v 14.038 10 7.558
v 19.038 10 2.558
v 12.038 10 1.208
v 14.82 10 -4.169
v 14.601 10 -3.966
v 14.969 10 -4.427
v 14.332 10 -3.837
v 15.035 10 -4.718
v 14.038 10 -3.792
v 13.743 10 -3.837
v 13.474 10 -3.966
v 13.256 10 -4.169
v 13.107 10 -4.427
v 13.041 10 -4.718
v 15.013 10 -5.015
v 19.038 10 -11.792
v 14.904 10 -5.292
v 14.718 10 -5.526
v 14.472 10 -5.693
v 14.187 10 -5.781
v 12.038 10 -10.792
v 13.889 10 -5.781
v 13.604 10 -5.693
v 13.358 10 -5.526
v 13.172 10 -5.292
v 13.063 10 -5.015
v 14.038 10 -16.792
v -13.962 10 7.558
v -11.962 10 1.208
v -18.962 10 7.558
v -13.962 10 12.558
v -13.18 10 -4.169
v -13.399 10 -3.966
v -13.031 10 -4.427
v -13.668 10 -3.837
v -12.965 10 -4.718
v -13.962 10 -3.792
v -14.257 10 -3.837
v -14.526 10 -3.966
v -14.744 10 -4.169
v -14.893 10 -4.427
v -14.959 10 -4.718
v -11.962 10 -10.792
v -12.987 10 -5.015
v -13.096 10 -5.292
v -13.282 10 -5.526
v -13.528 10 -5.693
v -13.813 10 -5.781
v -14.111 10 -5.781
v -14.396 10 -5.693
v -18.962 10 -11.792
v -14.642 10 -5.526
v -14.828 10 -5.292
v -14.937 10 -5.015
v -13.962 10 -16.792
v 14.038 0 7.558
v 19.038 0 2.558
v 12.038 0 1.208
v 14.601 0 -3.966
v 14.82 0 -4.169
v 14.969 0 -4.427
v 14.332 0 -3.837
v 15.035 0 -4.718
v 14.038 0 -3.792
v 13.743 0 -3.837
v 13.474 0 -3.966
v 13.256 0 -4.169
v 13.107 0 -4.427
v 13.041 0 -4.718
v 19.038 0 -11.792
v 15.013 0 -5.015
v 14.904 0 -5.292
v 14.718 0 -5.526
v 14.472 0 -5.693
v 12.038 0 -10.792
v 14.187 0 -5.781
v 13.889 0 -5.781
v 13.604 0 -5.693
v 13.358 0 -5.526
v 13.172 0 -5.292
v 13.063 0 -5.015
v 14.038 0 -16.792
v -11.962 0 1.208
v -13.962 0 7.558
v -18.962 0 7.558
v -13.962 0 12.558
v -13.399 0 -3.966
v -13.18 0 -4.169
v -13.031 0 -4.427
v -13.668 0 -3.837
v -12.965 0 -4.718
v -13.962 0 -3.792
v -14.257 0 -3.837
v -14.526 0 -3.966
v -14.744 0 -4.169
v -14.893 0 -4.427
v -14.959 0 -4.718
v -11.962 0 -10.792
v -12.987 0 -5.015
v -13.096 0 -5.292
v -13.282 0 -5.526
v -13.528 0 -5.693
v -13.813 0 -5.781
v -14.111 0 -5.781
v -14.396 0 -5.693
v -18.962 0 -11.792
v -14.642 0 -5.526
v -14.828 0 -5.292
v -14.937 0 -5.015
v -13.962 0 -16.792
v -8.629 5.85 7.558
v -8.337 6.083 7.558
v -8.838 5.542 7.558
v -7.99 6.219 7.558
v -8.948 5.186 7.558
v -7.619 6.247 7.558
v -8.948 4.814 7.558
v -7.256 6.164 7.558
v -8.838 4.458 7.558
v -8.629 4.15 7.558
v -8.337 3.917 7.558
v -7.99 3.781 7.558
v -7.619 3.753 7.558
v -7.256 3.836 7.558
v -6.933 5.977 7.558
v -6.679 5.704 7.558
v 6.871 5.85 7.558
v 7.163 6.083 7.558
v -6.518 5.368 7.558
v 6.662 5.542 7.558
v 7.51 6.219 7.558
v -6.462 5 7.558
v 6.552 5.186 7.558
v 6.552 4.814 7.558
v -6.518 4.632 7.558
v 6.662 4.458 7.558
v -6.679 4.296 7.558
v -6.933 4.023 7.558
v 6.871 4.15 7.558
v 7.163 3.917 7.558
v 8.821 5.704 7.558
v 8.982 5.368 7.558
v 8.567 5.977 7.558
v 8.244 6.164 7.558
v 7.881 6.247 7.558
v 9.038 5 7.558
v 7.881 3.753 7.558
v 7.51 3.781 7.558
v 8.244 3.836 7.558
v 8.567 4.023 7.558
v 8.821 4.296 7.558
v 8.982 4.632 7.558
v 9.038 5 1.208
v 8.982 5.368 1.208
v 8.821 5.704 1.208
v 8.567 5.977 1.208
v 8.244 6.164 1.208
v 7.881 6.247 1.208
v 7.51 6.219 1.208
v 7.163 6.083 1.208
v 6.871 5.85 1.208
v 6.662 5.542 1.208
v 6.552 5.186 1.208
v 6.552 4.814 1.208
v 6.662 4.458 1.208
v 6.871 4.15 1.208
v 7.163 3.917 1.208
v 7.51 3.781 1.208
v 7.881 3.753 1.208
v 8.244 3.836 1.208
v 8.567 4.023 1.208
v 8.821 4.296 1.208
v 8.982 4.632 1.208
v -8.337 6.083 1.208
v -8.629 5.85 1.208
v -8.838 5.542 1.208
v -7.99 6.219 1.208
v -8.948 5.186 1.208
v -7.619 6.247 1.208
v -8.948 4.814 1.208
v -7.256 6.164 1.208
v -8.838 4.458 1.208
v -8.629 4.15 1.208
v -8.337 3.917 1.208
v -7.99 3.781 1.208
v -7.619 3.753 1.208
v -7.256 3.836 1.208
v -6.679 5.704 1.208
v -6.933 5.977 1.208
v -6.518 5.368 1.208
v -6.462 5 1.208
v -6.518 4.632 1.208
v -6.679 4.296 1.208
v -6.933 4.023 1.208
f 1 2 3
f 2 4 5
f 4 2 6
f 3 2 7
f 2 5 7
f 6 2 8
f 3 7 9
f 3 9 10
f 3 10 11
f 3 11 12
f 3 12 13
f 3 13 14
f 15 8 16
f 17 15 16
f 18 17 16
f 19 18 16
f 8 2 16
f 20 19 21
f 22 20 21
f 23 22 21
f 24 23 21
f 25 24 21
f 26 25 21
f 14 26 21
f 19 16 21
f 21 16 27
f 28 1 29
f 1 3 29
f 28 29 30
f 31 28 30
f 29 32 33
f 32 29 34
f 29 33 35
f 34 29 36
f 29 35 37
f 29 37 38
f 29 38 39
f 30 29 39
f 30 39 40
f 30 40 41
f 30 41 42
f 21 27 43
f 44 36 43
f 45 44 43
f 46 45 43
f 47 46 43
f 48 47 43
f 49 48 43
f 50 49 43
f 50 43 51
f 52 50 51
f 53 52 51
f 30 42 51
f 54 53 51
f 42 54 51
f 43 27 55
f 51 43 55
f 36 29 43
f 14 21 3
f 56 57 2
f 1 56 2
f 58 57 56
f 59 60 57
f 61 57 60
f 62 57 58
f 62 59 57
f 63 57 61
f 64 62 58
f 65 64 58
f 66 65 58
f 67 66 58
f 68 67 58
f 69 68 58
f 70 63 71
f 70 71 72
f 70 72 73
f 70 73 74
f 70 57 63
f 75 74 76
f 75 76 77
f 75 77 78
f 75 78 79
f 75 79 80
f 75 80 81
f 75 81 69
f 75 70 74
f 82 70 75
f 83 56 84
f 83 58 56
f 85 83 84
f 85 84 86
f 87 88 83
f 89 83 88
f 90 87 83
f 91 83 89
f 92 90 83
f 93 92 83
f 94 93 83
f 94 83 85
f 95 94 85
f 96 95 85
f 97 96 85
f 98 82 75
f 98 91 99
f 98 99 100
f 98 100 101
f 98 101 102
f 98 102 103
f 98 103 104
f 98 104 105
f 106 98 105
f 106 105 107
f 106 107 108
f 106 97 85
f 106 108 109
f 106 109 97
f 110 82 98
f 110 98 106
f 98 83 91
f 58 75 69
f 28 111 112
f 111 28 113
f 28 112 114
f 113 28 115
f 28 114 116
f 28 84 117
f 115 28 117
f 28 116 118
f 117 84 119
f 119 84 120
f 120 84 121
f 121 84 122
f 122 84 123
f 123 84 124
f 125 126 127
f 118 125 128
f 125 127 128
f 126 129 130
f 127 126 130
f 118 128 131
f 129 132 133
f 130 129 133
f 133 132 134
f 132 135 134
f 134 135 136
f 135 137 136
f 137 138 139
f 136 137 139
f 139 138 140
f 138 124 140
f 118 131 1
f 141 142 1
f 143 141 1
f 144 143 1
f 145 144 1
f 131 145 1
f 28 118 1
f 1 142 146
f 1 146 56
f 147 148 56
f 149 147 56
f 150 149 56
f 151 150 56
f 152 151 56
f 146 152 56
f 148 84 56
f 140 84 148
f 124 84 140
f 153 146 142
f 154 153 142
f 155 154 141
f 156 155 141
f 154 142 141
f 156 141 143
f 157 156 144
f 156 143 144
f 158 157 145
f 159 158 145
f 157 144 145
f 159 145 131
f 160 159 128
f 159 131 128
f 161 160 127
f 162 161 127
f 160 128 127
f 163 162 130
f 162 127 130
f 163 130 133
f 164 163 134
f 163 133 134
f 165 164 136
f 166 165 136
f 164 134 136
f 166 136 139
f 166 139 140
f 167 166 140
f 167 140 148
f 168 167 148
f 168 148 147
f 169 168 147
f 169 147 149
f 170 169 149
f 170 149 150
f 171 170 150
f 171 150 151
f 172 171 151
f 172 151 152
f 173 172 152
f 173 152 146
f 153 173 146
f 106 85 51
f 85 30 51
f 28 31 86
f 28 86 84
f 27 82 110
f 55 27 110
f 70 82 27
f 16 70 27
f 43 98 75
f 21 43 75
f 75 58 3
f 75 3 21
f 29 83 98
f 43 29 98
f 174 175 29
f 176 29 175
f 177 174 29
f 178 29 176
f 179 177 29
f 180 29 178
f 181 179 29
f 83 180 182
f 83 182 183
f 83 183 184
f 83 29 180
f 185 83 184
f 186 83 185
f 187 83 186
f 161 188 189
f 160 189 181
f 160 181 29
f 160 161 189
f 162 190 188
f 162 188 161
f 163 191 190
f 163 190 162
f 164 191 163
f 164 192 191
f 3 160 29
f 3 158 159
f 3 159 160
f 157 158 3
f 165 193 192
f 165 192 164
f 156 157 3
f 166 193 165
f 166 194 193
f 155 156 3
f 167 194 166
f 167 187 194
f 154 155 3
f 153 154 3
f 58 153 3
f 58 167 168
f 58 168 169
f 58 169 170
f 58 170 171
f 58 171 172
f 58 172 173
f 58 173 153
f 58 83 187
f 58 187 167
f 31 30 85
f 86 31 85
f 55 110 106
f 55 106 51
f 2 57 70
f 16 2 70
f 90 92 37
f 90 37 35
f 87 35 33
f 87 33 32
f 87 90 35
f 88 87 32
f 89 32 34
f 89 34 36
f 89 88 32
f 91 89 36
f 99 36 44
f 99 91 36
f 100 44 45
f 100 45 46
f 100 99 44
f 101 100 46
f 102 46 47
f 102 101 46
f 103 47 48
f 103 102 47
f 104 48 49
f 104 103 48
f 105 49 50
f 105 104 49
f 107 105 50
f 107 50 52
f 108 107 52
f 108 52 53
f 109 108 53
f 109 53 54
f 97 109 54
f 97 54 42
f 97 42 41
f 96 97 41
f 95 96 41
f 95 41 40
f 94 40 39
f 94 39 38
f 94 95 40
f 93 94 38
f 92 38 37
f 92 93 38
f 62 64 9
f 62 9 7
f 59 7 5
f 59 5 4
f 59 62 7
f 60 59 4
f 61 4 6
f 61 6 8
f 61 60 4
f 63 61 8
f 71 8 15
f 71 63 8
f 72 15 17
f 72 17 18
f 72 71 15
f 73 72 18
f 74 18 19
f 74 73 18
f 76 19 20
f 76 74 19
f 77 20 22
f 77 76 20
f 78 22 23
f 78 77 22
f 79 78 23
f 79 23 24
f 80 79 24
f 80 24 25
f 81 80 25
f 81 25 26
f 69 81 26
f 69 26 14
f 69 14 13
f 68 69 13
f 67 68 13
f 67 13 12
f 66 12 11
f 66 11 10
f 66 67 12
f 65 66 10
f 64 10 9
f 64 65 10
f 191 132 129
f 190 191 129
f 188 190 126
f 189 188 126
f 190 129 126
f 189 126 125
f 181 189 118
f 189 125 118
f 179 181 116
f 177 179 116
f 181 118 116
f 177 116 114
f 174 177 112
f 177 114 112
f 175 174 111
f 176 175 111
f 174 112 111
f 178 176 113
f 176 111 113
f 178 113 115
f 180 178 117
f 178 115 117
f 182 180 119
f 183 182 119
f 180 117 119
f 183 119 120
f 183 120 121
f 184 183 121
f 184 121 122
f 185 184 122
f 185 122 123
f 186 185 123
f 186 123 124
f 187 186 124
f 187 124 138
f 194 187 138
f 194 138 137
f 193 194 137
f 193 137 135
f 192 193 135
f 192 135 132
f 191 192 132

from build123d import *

# Parameters (mm, degrees)
SKETCH1_R           = 1
SKETCH1_W           = 24
SKETCH1_H           = 12
BOSS_EXTRUDE2_DEPTH = 10
CHAMFER1_SIZE       = 5
SKETCH3_R           = 1.25
CUT_EXTRUDE1_DEPTH  = 12
BOSS_EXTRUDE3_DEPTH = 10
CHAMFER2_SIZE       = 5


with BuildPart() as part:
    # Sketch1 → Boss-Extrude2 (new body)
    with BuildSketch(Plane(origin=(0, 0, 0), x_dir=(1, 0, 0), z_dir=(0, 1, 0))):
        Polygon((-18.962264151, -7.55754717), (19.037735849, -7.55754717), (19.037735849, 4.79245283), (19.037735849, 16.79245283), (-18.962264151, 16.79245283), (-18.962264151, 4.79245283), align=None)
        with Locations(Location((-13.962264151, 4.79245283, 0), (0, 0, 270))):
            Circle(SKETCH1_R, mode=Mode.SUBTRACT)
        with Locations(Location((14.037735849, 4.79245283, 0), (0, 0, 270))):
            Circle(SKETCH1_R, mode=Mode.SUBTRACT)
        with Locations((0.037735849, 4.79245283)):
            Rectangle(SKETCH1_W, SKETCH1_H, mode=Mode.SUBTRACT)
    extrude(amount=BOSS_EXTRUDE2_DEPTH)

    # Chamfer1
    chamfer1_edges = [part.edges().sort_by_distance(p)[0] for p in [
        (19.037735849, 5, 7.55754717),
        (-18.962264151, 5, 7.55754717),
        (-18.962264151, 5, -16.79245283),
        (19.037735849, 5, -16.79245283),
    ]]
    chamfer(chamfer1_edges, length=CHAMFER1_SIZE)

    # Sketch3 → Cut-Extrude1 (cut)
    with BuildSketch(Plane.XY.offset(7.55754717)):
        with Locations((-7.712264151, 5)):
            Circle(SKETCH3_R)
        with Locations((7.787735849, 5)):
            Circle(SKETCH3_R)
    extrude(amount=-CUT_EXTRUDE1_DEPTH, mode=Mode.SUBTRACT)

    # Sketch4 → Boss-Extrude3 (add)
    with BuildSketch(Plane(origin=(0, 10, 0), x_dir=(1, 0, 0), z_dir=(0, 1, 0))):
        Polygon((-13.962264151, -7.55754717), (-13.962264151, -12.55754717), (-18.962264151, -12.55754717), (-18.962264151, -2.55754717), (-13.962264151, -0.983393269), align=None)
    extrude(amount=-BOSS_EXTRUDE3_DEPTH)

    # Chamfer2
    chamfer2_edges = [part.edges().sort_by_distance(p)[0] for p in [
        (-18.962264151, 5, 12.55754717),
    ]]
    chamfer(chamfer2_edges, length=CHAMFER2_SIZE - 0.0001)  # a hair under: the kernel refuses the full size


solid = part.part
